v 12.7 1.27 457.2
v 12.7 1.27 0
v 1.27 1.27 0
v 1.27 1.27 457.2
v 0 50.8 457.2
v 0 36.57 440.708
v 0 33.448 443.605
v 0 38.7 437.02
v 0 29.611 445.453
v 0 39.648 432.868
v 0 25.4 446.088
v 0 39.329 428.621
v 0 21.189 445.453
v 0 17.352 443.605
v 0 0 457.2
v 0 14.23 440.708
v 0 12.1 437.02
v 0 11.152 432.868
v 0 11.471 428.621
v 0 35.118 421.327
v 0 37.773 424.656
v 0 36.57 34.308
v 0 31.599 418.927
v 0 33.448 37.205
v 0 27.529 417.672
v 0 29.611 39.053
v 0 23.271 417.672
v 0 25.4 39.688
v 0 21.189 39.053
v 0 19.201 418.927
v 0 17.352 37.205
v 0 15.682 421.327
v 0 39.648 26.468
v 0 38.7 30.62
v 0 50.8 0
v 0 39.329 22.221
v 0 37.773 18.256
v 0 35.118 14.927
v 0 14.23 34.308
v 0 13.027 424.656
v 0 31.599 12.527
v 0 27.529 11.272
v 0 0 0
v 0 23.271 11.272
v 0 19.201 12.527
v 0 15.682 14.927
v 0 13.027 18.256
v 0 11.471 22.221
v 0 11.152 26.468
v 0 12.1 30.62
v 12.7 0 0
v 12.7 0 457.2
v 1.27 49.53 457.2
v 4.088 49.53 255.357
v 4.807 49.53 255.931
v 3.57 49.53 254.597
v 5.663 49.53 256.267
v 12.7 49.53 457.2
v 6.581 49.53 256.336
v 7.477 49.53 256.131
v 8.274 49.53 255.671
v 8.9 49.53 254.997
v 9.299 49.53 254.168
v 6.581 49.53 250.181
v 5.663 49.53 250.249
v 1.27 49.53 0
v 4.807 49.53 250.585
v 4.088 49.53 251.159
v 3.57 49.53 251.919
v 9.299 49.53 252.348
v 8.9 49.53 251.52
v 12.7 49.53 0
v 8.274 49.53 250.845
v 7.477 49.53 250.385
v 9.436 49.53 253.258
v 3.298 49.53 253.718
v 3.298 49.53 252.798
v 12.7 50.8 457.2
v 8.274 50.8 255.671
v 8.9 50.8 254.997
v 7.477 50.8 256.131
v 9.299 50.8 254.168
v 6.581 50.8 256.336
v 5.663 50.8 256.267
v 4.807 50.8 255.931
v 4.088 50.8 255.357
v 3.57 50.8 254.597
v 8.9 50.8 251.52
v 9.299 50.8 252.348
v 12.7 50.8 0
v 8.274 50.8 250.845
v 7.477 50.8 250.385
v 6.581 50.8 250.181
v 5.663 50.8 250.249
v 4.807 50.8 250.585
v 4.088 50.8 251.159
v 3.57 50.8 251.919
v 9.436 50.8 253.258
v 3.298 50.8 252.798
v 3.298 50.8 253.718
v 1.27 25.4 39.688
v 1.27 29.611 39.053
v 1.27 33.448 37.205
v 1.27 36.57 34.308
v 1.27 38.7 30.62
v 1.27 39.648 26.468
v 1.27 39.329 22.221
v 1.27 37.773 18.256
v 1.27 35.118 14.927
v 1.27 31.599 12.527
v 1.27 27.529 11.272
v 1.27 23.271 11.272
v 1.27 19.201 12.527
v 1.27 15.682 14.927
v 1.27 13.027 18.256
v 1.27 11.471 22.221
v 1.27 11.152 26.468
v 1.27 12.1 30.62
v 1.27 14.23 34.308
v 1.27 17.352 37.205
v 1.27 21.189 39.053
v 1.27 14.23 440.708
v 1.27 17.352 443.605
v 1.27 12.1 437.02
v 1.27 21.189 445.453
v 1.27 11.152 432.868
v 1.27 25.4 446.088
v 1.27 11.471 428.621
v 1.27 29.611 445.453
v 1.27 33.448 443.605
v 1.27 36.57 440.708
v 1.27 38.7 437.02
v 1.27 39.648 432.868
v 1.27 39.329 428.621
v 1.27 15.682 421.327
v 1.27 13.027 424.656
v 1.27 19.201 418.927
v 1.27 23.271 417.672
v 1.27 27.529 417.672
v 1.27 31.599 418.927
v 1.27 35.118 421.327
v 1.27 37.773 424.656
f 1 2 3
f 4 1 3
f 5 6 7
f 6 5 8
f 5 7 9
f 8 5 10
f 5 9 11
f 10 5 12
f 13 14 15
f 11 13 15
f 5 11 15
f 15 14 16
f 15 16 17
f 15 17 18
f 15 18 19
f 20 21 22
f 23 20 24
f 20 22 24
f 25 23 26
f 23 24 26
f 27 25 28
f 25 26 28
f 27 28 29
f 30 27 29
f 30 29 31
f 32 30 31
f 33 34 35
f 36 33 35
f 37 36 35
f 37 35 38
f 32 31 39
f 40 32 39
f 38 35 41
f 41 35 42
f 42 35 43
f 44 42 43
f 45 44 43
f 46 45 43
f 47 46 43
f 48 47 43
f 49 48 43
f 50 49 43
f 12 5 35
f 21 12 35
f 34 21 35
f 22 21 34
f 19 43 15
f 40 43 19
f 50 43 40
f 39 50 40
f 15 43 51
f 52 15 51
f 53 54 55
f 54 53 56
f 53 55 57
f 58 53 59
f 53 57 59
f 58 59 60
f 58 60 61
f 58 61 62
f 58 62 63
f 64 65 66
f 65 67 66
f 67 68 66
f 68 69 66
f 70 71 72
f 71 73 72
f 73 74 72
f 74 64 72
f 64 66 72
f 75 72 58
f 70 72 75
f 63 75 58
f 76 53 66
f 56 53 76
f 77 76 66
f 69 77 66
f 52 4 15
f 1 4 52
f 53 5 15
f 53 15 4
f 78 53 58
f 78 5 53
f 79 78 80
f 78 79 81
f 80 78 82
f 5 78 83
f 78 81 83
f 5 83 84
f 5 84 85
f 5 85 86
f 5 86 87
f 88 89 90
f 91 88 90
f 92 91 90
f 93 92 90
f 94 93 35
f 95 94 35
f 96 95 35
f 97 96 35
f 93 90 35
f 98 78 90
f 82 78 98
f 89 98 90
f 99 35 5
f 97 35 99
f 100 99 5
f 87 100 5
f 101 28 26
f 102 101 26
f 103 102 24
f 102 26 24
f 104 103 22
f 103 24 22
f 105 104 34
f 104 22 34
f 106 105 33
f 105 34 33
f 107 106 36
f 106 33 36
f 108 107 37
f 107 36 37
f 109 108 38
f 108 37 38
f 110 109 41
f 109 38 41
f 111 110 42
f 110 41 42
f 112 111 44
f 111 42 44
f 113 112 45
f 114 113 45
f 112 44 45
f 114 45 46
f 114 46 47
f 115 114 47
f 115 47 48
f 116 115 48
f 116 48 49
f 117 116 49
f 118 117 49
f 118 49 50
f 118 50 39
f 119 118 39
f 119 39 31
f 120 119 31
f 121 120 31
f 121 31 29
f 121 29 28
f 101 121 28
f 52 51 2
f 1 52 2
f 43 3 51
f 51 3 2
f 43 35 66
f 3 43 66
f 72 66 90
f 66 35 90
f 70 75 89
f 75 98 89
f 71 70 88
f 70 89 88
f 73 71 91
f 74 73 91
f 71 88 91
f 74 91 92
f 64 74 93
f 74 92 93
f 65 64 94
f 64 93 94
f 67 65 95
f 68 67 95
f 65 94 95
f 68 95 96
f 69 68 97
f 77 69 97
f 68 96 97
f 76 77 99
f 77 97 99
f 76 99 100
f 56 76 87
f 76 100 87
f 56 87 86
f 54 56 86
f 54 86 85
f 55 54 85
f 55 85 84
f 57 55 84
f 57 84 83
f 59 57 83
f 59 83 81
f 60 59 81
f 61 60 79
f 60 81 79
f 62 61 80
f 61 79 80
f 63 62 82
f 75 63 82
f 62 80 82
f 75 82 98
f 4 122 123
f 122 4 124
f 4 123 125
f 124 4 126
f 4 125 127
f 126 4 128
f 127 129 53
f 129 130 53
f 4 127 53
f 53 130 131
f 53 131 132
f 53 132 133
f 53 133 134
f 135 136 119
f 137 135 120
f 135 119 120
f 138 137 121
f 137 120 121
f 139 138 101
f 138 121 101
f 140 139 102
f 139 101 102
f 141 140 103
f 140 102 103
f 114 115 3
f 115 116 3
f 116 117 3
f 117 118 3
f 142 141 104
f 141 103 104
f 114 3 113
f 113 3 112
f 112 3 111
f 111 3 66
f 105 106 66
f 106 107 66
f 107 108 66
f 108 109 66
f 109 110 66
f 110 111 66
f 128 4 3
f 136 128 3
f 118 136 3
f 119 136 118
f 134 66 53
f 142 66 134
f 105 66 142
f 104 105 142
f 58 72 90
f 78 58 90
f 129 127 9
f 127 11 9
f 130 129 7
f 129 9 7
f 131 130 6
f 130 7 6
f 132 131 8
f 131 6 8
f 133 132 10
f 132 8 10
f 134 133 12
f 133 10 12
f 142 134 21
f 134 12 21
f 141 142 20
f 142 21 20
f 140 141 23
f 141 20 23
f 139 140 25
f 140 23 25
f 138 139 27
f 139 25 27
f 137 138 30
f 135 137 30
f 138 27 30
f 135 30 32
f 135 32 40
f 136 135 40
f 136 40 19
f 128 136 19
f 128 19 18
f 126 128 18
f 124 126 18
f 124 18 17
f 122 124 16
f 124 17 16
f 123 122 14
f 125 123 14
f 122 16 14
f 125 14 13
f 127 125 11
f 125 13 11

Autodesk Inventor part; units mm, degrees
ref_plane "YZ Plane" through (0, 0, 0) normal (1, 0, 0) x (0, 1, 0)
ref_plane "XZ Plane" through (0, 0, 0) normal (0, 1, 0) x (-1, 0, 0)
ref_plane "XY Plane" through (0, 0, 0) normal (0, 0, 1) x (1, 0, 0)
sketch "Sketch1" plane through (0, 0, 0) normal (0, 0, 1) x (1, 0, 0)
  line L0 (0, 0) -> (12.7, 0)
  line L1 (12.7, 50.8) -> (0, 50.8)
  line L2 (0, 50.8) -> (0, 0)
  line L3 (12.7, 1.27) -> (1.27, 1.27)
  line L4 (1.27, 1.27) -> (1.27, 49.53)
  line L5 (1.27, 49.53) -> (12.7, 49.53)
  line L6 (12.7, 0) -> (12.7, 1.27)
  line L7 (12.7, 49.53) -> (12.7, 50.8)
  dimension "d0" = 12.7
  dimension "d1" = 50.8
  dimension "d2" = 11.43
  dimension "d3" = 48.26
extrude "Extrusion1" add sketch "Sketch1" along normal blind 457.2
sketch "Sketch2" plane through (0, 0, 0) normal (-1, 0, 0) x (0, 0, 1)
  circle A0 centre (25.4, 25.4) radius 14.2875
  circle A1 centre (431.8, 25.4) radius 14.2875
  point P0 (0, 0)
  dimension "d6" = 28.575
  dimension "d7" = 28.575
extrude "Extrusion2" cut sketch "Sketch2" against normal through all
sketch "Sketch3" plane through (0, 50.8, 0) normal (0, 1, 0) x (1, 0, 0)
  line L0 (12.7237, -456.4581) -> (12.7, -253.2581)
  line L1 (12.7, 0) -> (12.7, -457.2) projected
  line L2 (0, 0) -> (0, -457.2) projected
  circle A0 centre (6.35, -253.2581) radius 3.0861
  dimension "d12" = 6.1722
extrude "Extrusion3" cut sketch "Sketch3" against normal blind 12.7
equation "\"d4\" = u1"
equation "\"u1\" = 457.2"
properties part number "VerseFrameCChannel 18in"
